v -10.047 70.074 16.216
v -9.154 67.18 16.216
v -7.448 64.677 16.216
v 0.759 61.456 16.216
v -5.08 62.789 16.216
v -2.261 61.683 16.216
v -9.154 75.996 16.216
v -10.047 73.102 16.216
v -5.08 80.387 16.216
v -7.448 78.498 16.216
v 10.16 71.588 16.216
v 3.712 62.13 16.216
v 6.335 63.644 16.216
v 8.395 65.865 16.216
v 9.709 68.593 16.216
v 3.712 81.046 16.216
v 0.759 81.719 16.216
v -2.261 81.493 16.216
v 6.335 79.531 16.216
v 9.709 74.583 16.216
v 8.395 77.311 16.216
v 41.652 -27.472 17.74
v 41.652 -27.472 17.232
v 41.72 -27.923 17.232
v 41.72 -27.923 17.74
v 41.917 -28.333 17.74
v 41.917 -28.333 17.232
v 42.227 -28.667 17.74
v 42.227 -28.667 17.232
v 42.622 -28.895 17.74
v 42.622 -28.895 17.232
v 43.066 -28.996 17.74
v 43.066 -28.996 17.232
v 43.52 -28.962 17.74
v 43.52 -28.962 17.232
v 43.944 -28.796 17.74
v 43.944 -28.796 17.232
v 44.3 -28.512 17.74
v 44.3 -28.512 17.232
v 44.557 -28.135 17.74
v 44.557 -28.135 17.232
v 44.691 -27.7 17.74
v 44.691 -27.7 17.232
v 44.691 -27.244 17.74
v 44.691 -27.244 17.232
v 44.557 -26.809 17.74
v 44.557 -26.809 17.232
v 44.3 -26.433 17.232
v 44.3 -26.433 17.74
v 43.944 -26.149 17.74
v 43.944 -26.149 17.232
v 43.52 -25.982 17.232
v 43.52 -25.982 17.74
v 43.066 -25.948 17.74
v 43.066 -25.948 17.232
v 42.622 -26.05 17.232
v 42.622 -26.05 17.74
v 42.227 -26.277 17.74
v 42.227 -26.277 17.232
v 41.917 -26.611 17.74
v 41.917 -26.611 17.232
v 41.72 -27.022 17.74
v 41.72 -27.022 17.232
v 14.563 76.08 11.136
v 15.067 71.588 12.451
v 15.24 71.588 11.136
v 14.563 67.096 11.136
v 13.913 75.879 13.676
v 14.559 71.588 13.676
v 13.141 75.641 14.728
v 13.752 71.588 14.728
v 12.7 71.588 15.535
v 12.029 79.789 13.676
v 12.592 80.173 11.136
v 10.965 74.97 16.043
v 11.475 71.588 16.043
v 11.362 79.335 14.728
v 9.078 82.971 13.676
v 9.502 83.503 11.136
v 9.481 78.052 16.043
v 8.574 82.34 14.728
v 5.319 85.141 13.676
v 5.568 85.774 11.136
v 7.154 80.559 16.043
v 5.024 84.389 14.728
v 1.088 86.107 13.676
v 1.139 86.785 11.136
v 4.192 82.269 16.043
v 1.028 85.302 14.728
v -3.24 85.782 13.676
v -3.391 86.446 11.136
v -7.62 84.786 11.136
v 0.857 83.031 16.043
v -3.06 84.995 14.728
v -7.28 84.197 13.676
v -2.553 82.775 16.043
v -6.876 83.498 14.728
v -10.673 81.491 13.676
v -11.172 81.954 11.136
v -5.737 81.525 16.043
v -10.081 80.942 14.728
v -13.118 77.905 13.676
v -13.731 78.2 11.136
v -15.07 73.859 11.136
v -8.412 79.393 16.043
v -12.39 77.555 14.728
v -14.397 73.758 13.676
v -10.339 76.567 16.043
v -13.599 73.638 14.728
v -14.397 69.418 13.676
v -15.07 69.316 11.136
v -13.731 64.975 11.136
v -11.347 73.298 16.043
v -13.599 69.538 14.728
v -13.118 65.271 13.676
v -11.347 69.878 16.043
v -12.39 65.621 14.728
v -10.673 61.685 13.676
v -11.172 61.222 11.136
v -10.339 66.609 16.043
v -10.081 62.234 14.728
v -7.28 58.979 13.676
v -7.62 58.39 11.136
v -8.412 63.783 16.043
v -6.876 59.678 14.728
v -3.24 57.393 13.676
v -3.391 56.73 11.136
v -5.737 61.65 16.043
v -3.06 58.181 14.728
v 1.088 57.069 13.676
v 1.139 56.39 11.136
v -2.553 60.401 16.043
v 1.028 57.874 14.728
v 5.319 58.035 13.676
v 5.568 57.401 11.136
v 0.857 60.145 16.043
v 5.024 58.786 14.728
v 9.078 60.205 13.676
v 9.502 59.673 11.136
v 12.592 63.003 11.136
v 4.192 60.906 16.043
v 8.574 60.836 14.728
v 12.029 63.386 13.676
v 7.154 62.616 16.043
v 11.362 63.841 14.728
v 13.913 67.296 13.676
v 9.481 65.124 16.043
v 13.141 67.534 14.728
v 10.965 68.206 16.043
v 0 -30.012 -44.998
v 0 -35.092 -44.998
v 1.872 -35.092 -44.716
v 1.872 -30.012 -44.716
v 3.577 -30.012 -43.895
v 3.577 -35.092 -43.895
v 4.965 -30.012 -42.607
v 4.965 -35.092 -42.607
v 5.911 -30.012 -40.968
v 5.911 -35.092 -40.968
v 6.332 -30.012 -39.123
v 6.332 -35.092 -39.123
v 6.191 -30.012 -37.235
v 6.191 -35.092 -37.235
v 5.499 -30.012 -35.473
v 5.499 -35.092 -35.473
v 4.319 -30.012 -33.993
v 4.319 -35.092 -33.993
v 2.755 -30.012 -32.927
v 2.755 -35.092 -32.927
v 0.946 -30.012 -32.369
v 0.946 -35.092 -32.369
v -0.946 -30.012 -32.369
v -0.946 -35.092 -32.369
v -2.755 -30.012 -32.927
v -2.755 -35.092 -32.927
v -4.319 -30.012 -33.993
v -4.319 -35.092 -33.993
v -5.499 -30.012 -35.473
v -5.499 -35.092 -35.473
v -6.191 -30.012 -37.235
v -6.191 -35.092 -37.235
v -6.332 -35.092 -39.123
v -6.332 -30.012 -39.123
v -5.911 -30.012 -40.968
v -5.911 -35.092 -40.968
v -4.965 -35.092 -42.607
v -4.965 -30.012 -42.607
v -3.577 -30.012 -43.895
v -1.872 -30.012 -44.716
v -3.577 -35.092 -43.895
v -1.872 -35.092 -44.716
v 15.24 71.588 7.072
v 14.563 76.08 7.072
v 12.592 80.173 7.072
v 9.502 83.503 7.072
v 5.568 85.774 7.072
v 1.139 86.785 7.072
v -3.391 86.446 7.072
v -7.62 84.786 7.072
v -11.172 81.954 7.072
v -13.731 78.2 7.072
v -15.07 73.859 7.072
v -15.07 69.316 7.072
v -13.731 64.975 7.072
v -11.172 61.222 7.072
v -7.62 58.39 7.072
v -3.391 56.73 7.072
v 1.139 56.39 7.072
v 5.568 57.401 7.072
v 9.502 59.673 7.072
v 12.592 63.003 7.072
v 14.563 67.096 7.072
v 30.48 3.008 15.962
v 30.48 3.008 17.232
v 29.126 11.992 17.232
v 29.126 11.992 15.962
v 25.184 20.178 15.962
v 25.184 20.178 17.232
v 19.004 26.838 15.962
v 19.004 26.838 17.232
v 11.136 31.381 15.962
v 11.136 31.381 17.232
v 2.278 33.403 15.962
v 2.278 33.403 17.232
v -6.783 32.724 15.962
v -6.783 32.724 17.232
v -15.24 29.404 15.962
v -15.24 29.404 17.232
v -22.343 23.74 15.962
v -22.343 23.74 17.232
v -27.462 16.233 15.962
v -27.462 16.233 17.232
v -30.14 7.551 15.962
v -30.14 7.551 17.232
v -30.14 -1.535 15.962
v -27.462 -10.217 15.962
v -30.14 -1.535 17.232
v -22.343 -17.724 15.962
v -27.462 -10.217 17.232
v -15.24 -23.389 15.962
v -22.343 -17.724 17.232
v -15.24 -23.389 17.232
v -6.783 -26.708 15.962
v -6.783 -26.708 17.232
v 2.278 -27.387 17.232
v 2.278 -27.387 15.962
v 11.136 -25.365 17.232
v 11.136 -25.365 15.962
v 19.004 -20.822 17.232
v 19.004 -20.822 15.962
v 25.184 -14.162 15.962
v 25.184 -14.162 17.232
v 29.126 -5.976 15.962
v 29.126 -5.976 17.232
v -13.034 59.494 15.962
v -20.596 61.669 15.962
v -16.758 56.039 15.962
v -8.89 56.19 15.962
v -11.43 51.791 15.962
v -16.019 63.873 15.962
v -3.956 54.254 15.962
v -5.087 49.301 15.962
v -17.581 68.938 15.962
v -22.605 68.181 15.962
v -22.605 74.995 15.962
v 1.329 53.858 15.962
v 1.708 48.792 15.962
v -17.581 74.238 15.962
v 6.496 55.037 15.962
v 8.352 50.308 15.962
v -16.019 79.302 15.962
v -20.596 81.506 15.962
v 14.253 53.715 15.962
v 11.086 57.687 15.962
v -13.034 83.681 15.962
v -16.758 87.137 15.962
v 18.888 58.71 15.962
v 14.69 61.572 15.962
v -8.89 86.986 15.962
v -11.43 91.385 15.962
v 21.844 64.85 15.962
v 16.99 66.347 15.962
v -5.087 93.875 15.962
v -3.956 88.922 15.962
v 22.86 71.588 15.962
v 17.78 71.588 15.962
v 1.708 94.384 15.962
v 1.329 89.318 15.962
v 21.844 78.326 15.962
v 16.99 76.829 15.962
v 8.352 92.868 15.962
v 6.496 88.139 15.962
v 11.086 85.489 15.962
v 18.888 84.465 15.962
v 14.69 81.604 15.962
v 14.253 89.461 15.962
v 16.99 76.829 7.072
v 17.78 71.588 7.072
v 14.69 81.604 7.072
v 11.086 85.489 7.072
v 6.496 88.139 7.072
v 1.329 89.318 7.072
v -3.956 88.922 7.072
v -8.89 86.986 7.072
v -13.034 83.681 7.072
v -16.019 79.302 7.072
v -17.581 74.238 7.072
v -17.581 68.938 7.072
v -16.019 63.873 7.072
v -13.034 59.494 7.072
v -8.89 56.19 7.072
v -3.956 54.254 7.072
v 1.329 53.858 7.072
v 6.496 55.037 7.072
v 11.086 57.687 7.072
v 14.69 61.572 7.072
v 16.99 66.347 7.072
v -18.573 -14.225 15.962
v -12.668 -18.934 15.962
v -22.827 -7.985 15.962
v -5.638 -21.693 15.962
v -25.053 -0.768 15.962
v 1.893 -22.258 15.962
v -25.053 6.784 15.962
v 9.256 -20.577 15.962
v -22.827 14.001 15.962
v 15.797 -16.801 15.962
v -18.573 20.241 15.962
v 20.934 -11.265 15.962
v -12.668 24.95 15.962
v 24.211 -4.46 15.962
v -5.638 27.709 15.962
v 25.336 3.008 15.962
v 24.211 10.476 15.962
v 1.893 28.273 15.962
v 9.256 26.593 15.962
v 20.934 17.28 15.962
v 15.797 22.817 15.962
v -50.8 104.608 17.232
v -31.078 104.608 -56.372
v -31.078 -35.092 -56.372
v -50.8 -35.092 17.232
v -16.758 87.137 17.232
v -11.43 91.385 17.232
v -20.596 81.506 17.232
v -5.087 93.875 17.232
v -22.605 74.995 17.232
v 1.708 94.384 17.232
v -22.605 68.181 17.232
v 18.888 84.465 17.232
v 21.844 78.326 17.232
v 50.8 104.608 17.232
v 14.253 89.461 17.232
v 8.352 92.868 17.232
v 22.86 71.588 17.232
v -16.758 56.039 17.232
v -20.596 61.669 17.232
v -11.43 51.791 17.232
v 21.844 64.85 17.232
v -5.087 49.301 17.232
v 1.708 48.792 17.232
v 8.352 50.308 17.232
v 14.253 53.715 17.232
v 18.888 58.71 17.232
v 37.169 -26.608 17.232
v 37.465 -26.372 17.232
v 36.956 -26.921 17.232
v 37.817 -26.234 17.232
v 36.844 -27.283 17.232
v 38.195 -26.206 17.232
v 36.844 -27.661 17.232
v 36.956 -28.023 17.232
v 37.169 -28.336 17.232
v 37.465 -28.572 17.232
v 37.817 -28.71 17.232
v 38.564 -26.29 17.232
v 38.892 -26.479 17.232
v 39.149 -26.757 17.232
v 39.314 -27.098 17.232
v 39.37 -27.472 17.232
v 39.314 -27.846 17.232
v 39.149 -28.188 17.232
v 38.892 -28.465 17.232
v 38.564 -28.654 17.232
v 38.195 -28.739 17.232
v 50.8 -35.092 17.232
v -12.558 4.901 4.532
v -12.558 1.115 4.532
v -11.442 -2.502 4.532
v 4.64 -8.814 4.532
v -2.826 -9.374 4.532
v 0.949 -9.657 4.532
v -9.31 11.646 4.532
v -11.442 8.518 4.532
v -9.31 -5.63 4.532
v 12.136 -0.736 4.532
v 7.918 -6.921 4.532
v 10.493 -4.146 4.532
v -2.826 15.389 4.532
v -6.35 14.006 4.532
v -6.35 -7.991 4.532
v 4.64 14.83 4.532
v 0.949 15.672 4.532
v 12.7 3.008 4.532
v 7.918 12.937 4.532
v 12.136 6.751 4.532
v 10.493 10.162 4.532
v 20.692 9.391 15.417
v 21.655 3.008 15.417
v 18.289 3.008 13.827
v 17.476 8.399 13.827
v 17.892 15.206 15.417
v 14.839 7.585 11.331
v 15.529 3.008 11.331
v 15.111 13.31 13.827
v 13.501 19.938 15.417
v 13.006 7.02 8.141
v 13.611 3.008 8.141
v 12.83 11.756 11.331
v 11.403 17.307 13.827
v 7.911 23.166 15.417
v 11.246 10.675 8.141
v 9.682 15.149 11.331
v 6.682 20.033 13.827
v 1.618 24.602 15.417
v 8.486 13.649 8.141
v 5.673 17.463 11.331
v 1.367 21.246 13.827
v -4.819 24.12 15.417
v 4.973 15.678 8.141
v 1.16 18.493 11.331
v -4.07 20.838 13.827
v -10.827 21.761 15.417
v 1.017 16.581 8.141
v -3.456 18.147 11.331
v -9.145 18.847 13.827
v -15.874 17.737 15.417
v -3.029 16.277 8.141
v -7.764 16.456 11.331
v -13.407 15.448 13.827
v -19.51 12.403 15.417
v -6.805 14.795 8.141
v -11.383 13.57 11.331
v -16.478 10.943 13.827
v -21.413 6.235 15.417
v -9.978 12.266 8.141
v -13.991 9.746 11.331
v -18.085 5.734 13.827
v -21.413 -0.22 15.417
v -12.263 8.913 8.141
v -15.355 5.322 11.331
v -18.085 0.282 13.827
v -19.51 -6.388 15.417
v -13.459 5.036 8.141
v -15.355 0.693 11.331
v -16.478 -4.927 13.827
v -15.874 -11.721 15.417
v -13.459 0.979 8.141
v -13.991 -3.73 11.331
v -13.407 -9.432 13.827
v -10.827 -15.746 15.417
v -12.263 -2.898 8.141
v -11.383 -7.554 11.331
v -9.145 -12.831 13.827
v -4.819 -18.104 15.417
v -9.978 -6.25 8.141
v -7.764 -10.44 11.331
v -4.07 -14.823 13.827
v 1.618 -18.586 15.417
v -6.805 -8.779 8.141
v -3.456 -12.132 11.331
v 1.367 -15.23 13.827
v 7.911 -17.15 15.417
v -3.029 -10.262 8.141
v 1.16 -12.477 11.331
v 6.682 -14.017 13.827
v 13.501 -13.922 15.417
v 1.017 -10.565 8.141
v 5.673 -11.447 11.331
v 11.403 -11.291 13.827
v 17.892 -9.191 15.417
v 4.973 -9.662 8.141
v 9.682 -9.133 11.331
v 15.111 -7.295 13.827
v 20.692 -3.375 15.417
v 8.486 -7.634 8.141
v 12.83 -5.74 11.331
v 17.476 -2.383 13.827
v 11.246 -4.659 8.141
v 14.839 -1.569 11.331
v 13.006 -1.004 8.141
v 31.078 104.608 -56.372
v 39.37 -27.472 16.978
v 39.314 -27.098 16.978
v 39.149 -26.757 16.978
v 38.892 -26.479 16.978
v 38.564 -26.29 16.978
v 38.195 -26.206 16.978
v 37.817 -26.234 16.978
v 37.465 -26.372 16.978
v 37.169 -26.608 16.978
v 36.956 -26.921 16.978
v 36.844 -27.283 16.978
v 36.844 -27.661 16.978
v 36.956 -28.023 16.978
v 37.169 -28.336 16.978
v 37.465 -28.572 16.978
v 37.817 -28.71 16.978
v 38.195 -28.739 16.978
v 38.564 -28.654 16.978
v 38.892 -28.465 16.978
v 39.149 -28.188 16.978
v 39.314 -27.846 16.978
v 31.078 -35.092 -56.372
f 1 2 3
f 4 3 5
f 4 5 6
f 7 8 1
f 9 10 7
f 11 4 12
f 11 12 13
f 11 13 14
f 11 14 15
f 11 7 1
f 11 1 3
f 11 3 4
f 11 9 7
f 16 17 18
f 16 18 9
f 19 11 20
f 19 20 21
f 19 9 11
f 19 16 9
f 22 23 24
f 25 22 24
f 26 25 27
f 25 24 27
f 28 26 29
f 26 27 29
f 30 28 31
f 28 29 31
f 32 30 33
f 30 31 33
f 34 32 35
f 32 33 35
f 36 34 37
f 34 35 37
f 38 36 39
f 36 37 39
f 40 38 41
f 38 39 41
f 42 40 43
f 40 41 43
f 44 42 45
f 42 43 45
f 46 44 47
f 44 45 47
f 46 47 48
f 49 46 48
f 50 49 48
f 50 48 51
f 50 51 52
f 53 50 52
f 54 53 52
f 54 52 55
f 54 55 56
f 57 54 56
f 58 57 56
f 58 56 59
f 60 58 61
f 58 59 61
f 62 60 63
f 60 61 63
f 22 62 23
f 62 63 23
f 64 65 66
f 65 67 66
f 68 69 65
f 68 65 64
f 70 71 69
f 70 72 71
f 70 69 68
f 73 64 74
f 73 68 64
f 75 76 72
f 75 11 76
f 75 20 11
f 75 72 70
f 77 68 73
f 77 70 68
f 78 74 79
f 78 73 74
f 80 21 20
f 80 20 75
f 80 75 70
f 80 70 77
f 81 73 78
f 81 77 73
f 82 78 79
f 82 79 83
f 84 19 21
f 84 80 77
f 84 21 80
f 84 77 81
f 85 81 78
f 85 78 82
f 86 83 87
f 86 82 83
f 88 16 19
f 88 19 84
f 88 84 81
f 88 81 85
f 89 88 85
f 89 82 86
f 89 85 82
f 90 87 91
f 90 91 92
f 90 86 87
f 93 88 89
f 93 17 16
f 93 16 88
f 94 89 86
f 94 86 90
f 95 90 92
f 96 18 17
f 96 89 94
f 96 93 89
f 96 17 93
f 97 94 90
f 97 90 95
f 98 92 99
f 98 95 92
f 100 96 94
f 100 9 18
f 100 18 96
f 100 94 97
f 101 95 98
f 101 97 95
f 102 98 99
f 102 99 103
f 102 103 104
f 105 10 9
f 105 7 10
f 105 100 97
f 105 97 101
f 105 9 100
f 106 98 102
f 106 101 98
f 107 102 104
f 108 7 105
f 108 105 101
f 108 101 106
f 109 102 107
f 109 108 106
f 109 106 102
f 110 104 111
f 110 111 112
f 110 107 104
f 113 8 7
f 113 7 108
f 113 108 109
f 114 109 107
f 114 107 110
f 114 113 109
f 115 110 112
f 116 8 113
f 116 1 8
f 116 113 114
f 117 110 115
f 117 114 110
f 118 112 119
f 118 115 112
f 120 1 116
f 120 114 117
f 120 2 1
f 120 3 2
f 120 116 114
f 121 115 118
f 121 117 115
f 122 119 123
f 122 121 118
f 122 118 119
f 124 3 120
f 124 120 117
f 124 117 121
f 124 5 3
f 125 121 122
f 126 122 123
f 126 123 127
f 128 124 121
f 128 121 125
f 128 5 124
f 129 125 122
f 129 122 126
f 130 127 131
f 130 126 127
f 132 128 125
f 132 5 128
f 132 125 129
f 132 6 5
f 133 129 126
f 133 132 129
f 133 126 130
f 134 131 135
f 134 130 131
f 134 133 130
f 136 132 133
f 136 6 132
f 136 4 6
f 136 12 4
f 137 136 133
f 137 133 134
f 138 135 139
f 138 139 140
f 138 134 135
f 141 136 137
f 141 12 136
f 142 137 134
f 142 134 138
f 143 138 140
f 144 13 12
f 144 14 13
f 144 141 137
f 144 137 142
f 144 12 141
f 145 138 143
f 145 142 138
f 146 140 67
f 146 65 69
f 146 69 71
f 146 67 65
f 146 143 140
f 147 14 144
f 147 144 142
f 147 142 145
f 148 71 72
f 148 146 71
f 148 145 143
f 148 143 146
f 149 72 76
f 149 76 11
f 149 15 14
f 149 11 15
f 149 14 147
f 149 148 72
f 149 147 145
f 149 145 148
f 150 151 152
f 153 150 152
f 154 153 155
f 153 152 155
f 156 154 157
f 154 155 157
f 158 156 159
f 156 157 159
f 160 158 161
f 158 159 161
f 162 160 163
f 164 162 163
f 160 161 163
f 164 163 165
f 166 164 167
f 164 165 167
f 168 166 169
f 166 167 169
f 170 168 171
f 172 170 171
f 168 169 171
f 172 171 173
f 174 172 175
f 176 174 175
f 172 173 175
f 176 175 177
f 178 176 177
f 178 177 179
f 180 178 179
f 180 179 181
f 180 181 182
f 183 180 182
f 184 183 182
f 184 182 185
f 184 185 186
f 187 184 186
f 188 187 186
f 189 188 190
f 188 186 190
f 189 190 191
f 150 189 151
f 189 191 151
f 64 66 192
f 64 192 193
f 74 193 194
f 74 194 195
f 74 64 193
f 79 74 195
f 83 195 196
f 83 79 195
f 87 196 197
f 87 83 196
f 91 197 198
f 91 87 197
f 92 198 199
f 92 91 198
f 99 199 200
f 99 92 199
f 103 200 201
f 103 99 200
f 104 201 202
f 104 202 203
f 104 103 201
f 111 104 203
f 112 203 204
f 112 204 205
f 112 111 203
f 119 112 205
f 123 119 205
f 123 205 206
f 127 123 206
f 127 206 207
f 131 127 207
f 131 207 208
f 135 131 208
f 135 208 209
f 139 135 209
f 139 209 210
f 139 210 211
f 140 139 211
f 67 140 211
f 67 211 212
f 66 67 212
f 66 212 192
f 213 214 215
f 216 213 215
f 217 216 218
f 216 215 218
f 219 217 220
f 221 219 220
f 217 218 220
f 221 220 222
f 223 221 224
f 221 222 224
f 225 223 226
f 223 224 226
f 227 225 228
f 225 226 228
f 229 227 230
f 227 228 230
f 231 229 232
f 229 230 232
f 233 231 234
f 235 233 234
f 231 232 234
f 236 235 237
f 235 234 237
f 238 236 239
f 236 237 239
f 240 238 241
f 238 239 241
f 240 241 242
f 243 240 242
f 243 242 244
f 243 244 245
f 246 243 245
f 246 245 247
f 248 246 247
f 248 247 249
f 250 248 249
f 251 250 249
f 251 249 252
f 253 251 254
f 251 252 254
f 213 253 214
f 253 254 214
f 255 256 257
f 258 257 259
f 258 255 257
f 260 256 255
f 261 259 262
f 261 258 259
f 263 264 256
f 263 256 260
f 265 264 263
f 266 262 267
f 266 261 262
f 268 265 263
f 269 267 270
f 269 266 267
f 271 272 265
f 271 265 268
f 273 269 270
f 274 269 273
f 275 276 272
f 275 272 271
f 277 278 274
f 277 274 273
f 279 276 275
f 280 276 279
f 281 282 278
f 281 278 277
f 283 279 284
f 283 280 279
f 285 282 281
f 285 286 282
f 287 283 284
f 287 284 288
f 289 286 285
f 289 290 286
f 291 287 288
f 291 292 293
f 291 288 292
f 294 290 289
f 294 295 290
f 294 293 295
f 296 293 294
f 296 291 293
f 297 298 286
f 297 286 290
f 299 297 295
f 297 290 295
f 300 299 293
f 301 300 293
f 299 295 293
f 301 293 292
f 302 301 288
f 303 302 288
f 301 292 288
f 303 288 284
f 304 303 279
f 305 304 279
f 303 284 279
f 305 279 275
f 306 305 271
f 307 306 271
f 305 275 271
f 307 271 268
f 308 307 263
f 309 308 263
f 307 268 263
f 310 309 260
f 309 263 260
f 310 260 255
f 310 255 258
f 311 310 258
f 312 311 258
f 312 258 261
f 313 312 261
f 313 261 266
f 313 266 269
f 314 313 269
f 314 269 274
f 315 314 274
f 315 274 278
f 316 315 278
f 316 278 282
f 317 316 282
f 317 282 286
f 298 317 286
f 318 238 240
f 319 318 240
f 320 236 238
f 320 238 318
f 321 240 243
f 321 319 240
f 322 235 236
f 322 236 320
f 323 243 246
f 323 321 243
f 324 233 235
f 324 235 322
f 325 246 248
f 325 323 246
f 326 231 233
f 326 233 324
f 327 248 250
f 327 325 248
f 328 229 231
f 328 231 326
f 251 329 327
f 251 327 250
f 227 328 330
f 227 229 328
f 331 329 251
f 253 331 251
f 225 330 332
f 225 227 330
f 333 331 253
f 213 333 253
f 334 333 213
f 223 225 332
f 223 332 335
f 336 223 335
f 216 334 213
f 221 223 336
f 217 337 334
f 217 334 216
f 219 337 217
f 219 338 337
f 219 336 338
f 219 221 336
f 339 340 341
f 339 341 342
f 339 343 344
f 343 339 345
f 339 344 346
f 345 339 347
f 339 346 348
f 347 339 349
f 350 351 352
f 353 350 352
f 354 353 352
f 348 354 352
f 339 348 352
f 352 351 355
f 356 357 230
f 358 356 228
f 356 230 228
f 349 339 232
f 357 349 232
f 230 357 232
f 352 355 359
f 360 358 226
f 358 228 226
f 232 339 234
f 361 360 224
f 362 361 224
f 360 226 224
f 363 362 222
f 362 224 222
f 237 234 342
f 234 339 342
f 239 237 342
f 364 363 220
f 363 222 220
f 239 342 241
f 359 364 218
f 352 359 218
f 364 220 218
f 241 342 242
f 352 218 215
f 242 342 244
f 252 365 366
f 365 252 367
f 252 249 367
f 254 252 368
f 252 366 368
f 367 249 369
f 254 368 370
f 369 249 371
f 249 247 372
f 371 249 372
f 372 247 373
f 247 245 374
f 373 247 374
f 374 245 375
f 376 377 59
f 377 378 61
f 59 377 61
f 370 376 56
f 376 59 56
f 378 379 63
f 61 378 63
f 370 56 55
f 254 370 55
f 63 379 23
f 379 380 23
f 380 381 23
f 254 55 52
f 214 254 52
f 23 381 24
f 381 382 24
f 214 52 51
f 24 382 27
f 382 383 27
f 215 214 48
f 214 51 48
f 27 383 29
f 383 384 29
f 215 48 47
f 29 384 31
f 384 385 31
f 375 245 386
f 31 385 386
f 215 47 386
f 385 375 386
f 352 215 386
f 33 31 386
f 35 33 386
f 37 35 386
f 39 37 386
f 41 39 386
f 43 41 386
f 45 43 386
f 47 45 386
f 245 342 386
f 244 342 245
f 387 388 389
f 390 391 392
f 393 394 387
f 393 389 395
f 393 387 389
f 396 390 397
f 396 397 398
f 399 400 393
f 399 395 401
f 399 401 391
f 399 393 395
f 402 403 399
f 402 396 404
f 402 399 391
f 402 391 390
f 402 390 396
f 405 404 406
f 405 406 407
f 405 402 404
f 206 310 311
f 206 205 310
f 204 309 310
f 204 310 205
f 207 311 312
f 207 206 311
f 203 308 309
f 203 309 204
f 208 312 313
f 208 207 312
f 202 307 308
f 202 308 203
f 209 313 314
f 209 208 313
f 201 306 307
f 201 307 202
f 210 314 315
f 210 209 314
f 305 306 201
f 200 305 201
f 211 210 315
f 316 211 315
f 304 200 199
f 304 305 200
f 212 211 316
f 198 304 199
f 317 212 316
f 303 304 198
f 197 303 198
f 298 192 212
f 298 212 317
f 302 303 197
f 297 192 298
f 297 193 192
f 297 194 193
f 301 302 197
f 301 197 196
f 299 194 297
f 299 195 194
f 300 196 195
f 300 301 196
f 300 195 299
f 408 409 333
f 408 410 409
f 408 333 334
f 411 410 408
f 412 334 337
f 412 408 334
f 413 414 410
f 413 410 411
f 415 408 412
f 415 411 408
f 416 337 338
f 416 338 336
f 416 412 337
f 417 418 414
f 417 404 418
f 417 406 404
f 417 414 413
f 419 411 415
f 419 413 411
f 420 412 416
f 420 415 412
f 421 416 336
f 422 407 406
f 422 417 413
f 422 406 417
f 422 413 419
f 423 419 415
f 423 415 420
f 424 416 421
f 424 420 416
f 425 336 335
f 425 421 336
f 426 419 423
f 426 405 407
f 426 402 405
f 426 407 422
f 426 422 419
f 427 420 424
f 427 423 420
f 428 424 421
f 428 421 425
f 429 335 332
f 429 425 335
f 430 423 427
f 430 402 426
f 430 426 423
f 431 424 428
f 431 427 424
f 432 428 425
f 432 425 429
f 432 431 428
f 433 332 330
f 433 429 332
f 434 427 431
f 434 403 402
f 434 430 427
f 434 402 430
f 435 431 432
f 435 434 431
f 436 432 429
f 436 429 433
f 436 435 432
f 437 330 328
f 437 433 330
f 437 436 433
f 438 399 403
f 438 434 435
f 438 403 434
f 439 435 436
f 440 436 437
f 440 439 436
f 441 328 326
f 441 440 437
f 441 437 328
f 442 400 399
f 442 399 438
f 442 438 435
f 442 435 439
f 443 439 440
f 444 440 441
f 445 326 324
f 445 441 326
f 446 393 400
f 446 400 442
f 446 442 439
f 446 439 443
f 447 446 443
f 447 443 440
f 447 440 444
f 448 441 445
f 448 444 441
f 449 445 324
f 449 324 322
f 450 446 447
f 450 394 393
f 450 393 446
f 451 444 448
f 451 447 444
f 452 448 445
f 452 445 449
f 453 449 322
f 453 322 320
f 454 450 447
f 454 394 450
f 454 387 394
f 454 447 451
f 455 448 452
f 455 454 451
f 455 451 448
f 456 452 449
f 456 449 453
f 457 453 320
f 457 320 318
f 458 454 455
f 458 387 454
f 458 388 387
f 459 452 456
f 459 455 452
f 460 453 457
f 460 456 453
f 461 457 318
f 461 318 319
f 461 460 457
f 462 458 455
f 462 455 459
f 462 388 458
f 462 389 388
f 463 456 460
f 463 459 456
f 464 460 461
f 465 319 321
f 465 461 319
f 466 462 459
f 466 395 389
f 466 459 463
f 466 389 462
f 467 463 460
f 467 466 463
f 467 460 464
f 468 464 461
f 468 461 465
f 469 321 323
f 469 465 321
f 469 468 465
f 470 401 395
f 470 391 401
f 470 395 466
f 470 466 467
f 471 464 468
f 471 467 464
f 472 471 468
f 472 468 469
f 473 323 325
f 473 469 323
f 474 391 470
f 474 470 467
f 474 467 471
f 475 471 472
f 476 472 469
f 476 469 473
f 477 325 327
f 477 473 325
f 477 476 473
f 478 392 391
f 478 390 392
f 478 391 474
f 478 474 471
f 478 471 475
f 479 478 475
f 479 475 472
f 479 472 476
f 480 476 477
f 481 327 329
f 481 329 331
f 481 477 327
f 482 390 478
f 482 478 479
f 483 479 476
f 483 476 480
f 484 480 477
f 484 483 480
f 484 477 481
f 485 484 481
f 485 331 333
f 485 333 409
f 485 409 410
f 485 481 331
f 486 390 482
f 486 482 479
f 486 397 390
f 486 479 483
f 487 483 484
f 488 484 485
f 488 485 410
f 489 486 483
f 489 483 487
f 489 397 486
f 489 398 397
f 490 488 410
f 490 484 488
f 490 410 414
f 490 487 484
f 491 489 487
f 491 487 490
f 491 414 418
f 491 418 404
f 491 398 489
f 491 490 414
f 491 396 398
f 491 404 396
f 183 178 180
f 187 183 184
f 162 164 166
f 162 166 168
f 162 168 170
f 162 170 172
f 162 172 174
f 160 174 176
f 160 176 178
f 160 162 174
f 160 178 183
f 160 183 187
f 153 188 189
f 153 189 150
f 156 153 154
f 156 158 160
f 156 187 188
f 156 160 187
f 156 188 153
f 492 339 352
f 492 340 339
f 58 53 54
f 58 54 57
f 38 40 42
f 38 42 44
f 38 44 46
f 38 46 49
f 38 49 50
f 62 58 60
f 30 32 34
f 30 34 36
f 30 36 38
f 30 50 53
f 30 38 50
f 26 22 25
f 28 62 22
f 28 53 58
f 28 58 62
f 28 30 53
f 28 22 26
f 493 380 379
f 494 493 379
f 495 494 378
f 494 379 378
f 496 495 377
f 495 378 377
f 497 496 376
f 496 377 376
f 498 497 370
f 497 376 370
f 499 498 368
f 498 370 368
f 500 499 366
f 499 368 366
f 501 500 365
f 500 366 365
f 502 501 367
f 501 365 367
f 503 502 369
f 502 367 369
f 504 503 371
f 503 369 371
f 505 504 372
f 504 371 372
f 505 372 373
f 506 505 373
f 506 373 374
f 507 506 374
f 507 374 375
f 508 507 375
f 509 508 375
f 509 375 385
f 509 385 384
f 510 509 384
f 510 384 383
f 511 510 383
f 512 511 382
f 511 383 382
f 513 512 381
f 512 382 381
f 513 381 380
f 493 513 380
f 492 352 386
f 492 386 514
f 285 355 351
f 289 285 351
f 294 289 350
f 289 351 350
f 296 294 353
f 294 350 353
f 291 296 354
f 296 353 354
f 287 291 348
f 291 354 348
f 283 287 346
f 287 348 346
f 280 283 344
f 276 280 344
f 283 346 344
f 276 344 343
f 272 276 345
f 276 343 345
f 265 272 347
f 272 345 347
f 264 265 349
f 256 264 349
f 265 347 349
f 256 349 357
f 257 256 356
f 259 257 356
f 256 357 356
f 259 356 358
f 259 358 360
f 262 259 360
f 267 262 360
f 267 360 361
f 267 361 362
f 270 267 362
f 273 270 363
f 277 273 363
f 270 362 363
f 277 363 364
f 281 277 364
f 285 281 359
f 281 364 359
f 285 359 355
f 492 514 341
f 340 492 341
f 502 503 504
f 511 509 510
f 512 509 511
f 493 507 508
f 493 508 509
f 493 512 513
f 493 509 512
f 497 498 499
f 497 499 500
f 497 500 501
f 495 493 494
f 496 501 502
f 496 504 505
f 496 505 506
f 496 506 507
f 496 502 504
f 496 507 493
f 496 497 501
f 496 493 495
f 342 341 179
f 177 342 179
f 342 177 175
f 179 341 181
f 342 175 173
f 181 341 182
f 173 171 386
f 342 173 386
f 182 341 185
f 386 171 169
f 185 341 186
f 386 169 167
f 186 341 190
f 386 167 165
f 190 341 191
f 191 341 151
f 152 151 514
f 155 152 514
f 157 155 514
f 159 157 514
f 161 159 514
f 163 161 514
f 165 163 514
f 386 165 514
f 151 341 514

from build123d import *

# Parameters (mm, degrees)
BOSS_EXTRUDE1_DEPTH = 69.85
SKETCH3_R           = 11.43
SKETCH3_R_2         = 8.89
CUT_EXTRUDE1_DEPTH  = 0.635
SKETCH3_4_R         = 8.89
SKETCH3_4_R_2       = 7.62
CUT_EXTRUDE2_DEPTH  = 5.08
SKETCH3_5_R         = 7.62
CUT_EXTRUDE3_DEPTH  = 0.508
FILLET1_R           = 2.54
SKETCH3_6_R         = 15.24
SKETCH3_6_R_2       = 6.35
CUT_EXTRUDE4_DEPTH  = 0.635
SKETCH3_7_R         = 6.35
CUT_EXTRUDE5_DEPTH  = 6.35
FILLET5_R           = 6.35
SKETCH7_R           = 0.764119483
BOSS_EXTRUDE3_DEPTH = 0.254
SKETCH7_4_R         = 0.635
CUT_EXTRUDE6_DEPTH  = 0.127
SKETCH8_R           = 3.175
CUT_EXTRUDE7_DEPTH  = 2.54
SCALE1_SCALE        = 2


with BuildPart() as part:
    # Sketch1 → Boss-Extrude1 (new body)
    with BuildSketch(Plane(origin=(0, 0, 0), x_dir=(1, 0, 0), z_dir=(0, 1, 0))):
        Polygon((-25.4, 0), (25.4, 0), (15.538994382, 36.801773982), (-15.538994382, 36.801773982), align=None)
    extrude(amount=BOSS_EXTRUDE1_DEPTH)

    # Sketch3 → Cut-Extrude1 (cut)
    with BuildSketch(Plane.XY):
        with Locations((0, 53.34)):
            Circle(SKETCH3_R)
        with Locations((0, 53.34)):
            Circle(SKETCH3_R_2, mode=Mode.SUBTRACT)
    extrude(amount=-CUT_EXTRUDE1_DEPTH, mode=Mode.SUBTRACT)

    # Sketch3<4> → Cut-Extrude2 (cut)
    with BuildSketch(Plane.XY):
        with Locations((0, 53.34)):
            Circle(SKETCH3_4_R)
        with Locations((0, 53.34)):
            Circle(SKETCH3_4_R_2, mode=Mode.SUBTRACT)
    extrude(amount=-CUT_EXTRUDE2_DEPTH, mode=Mode.SUBTRACT)

    # Sketch3<5> → Cut-Extrude3 (cut)
    with BuildSketch(Plane.XY):
        with Locations((0, 53.34)):
            Circle(SKETCH3_5_R)
    extrude(amount=-CUT_EXTRUDE3_DEPTH, mode=Mode.SUBTRACT)

    # Fillet1
    fillet1_edges = [part.edges().sort_by_distance(p)[0] for p in [
        (-7.62, 53.34, -0.508),
    ]]
    fillet(fillet1_edges, radius=FILLET1_R)

    # Sketch3<6> → Cut-Extrude4 (cut)
    with BuildSketch(Plane.XY):
        with Locations((0, 19.05)):
            Circle(SKETCH3_6_R)
        with Locations((0, 19.05)):
            Circle(SKETCH3_6_R_2, mode=Mode.SUBTRACT)
    extrude(amount=-CUT_EXTRUDE4_DEPTH, mode=Mode.SUBTRACT)

    # Sketch3<7> → Cut-Extrude5 (cut)
    with BuildSketch(Plane.XY):
        with Locations((0, 19.05)):
            Circle(SKETCH3_7_R)
    extrude(amount=-CUT_EXTRUDE5_DEPTH, mode=Mode.SUBTRACT)

    # Fillet5
    # the kernel refuses this fillet: 6.35 mm, written as the material it takes off along each edge
    with BuildSketch(Plane(origin=(0, 19.05, -0.635), x_dir=(1, 0, 0), z_dir=(0, -1, 0))) as fillet5_piece_1:
        with BuildLine():
            CenterArc((12.668170226, -6.35), FILLET5_R, 90, 84.260829523)
            Line((6.35, -5.715), (6.223636595, -5.7023))
            ThreePointArc((6.223636595, -5.7023), (6.223, -2.8575), (6.223, 0))
            Line((6.223, 0), (6.35, 0.127))
            Line((6.35, 0.127), (12.668170226, 0.127))
            Line((12.668170226, 0.127), (12.668170226, 0))
        make_face()
    revolve(axis=Axis((0, 19.05, -0.635), (0, 0, 1)), mode=Mode.SUBTRACT)

    # Sketch7 → Boss-Extrude3 (add)
    with BuildSketch(Plane.XY):
        with Locations(Location((21.59, 3.81, 0), (0, 0, 180))):
            Circle(SKETCH7_R)
    extrude(amount=BOSS_EXTRUDE3_DEPTH)

    # Sketch7<4> → Cut-Extrude6 (cut)
    with BuildSketch(Plane.XY):
        with Locations((19.05, 3.81)):
            Circle(SKETCH7_4_R)
    extrude(amount=-CUT_EXTRUDE6_DEPTH, mode=Mode.SUBTRACT)

    # Sketch8 → Cut-Extrude7 (cut)
    with BuildSketch(Plane.XZ):
        with Locations(Location((0, -27.94, 0), (0, 0, 270))):
            Circle(SKETCH8_R)
    extrude(amount=-CUT_EXTRUDE7_DEPTH, mode=Mode.SUBTRACT)


with BuildPart() as part_1:
    # Scale1: scaled about (6.7929e-05, 35.092141807, -17.231977993)
    add(part.part.scale(SCALE1_SCALE).moved(Location((-6.7929e-05, -35.092141807, 17.231977993))))


solid = part_1.part
